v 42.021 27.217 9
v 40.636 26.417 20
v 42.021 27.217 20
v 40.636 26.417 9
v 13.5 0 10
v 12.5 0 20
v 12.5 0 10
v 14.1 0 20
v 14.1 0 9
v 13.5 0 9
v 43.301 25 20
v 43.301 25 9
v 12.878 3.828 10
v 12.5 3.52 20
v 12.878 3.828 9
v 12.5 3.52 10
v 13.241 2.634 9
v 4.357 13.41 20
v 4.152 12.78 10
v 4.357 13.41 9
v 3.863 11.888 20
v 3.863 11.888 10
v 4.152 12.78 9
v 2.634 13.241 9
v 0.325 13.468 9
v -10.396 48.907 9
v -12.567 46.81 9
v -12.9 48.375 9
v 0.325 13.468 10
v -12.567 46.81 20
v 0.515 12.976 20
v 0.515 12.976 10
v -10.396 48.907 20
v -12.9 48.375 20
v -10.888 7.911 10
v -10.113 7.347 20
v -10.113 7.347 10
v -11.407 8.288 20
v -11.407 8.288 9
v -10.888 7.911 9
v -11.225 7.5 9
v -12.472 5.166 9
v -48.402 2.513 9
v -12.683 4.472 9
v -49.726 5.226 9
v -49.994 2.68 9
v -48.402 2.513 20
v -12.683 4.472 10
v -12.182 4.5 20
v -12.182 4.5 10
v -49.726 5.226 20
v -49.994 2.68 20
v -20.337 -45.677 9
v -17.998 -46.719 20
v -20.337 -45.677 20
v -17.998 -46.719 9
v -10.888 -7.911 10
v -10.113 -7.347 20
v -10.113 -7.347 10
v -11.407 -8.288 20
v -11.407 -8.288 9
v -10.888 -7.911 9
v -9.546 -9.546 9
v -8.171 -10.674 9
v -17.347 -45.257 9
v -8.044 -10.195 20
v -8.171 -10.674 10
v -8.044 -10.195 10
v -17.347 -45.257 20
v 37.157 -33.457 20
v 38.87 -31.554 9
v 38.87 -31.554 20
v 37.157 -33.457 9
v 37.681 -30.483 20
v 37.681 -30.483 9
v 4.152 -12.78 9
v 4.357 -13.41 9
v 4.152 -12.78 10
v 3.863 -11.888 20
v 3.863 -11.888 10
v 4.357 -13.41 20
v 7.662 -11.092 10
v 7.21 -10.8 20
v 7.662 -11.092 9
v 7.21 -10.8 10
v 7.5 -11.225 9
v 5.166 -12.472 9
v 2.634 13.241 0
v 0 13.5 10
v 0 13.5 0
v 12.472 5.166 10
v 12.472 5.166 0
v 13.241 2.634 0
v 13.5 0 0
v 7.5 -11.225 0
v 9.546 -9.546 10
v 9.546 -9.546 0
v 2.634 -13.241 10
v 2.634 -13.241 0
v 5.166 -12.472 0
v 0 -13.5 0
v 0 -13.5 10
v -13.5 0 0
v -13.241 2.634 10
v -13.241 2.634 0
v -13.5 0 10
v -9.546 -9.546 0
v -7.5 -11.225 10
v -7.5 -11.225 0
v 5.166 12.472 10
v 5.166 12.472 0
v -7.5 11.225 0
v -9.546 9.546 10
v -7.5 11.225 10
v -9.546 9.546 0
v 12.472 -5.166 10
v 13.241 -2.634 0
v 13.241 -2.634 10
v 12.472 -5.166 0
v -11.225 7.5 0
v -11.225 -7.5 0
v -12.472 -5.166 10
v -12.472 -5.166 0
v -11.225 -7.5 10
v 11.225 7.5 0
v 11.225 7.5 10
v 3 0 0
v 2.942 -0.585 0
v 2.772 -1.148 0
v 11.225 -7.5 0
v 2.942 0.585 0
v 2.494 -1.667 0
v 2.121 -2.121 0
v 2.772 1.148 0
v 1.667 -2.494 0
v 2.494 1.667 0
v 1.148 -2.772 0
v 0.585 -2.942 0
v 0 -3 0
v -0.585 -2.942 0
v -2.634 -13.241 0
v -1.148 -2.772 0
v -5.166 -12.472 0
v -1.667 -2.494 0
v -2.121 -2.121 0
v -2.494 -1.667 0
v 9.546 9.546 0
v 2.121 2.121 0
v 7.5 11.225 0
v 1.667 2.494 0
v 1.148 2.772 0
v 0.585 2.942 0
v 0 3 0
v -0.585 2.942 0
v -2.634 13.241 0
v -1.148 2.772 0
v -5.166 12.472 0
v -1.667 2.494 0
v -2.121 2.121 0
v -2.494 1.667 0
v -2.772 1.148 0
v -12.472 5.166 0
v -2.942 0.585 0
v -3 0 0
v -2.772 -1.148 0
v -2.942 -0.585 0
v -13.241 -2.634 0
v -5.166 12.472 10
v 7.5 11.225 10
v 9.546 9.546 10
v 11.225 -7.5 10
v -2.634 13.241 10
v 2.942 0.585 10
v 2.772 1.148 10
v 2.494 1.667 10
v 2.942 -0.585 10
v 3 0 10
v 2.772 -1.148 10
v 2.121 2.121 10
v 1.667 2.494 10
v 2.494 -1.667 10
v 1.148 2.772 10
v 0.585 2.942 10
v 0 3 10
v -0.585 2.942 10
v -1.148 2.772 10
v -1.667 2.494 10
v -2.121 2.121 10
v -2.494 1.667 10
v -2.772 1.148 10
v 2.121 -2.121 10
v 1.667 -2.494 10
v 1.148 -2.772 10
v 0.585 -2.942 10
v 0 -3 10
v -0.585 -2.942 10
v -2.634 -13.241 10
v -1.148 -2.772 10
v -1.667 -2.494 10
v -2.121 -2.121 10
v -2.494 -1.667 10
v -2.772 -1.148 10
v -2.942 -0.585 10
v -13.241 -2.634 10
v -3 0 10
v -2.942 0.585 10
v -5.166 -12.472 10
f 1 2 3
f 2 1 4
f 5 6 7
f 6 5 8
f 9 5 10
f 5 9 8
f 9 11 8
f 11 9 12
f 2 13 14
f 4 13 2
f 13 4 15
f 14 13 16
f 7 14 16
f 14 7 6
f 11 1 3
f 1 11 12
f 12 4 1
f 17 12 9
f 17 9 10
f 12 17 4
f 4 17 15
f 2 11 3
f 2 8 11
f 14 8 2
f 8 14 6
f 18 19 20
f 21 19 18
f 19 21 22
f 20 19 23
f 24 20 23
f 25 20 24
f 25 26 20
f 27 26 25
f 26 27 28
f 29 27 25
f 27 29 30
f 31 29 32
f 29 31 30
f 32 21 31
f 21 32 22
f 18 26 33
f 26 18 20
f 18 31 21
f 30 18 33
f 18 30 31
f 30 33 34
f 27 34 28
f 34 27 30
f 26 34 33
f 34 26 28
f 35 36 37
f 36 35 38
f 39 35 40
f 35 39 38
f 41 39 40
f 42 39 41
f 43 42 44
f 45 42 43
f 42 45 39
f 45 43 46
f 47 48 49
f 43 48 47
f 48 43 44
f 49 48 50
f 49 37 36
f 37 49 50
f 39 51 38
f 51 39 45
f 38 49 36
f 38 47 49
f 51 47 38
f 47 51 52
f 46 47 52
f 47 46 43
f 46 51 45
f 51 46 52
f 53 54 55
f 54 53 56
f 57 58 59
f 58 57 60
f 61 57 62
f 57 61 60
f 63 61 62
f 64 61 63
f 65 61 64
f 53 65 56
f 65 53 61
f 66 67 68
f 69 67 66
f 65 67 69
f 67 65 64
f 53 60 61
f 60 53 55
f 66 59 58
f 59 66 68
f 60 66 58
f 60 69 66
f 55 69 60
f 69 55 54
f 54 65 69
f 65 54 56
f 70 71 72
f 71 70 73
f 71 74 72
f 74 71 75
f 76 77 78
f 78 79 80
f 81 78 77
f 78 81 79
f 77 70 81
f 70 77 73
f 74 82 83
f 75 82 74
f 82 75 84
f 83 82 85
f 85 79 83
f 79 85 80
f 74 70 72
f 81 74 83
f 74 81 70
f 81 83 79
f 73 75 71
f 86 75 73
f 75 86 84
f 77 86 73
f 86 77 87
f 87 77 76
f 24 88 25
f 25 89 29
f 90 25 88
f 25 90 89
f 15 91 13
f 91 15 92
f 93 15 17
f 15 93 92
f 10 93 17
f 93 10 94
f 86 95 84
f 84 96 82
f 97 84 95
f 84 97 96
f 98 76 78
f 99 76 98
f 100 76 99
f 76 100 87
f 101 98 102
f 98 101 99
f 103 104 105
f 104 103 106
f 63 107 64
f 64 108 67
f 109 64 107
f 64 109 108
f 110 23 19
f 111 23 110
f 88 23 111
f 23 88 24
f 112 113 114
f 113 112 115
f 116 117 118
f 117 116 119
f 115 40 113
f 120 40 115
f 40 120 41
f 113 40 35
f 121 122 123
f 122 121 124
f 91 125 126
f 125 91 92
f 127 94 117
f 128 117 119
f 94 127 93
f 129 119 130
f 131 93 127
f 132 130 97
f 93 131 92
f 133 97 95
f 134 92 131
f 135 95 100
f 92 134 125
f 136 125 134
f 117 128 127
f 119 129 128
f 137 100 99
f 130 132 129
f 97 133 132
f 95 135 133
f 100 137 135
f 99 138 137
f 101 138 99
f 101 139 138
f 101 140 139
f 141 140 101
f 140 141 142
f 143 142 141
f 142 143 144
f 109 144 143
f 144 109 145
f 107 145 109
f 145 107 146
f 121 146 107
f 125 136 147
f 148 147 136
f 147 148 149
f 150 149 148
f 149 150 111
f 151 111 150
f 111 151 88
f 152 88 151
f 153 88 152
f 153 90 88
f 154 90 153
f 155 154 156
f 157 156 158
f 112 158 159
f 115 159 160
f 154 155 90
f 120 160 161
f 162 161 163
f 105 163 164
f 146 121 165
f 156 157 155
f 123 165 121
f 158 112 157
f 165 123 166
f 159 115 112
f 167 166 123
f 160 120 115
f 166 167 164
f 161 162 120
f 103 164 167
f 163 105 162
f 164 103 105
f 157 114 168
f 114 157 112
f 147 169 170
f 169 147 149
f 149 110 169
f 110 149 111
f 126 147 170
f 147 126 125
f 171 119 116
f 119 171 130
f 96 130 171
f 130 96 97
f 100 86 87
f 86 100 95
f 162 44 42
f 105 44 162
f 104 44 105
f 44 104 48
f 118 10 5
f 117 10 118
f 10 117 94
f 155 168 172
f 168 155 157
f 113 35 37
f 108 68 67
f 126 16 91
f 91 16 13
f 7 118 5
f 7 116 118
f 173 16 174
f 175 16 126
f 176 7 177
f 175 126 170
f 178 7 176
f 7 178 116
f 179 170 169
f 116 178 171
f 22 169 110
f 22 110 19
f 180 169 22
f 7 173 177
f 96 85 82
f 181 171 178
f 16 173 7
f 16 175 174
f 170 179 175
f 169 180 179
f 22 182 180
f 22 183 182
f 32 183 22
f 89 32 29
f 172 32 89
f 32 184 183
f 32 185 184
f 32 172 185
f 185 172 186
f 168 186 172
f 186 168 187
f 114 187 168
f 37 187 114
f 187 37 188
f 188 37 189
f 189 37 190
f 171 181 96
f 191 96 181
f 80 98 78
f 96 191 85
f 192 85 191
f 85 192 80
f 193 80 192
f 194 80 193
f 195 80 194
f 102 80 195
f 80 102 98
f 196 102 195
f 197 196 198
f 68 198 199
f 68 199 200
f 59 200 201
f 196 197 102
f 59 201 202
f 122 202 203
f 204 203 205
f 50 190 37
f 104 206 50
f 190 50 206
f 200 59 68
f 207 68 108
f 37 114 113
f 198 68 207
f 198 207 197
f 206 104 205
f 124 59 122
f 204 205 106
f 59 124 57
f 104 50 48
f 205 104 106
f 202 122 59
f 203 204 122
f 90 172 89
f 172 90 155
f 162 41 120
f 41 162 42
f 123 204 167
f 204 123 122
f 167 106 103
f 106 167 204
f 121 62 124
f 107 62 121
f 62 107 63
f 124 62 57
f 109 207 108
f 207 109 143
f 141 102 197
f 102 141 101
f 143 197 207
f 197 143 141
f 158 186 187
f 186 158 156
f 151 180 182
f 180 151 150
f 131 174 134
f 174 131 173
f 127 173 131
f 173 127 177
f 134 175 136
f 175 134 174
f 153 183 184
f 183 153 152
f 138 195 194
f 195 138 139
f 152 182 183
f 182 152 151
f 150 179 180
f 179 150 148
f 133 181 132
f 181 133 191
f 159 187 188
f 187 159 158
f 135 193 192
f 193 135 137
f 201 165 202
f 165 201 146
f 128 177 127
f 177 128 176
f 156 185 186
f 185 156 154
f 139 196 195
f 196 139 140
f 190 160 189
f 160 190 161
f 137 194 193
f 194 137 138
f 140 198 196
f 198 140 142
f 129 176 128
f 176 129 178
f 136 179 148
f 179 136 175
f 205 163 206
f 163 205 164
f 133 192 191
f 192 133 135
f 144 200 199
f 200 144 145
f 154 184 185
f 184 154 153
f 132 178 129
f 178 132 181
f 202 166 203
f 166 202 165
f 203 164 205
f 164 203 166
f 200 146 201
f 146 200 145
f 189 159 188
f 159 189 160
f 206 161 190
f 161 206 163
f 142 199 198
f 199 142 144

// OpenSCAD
$fn = 32;

// ----------------------------------------------------------------------
// Impeller: 100 mm, 5 blades, 20 mm tall
// ----------------------------------------------------------------------

// --- parameters (mm) ---
hub_d = 27;               // hub diameter
hub_h = 10;               // hub height
imp_d = 100;              // outer diameter over the blades
blades = 5;               // number of blades
blade_t = 1.6;            // blade thickness
blade_h = 10;             // blade height
blade_in_r = 12.5;        // blade root radius
blade_out_r = 48.4;       // blade tip radius
sweep = 30;               // blade sweep, degrees
bore_d = 6;               // shaft bore

module hub() {
  cylinder(h = hub_h, d = hub_d);
}

module blade() {
  /* blade swept between two boxes: hull of the root and the tip section */
  hull() {
    translate([blade_in_r, 0, hub_h - 1])
      cube([blade_t, blade_t * 2.2, blade_h + 1], center = false);
    rotate([0, 0, sweep])
      translate([blade_out_r, 0, hub_h - 1])
        cube([blade_t, blade_t * 1.6, blade_h + 1], center = false);
  }
}

module blades() {
  for (i = [0 : blades - 1])
    rotate([0, 0, i * 360 / blades]) blade();
}

difference() {
  union() {
    hub();
    blades();
  }
  translate([0, 0, -1]) cylinder(h = hub_h + blade_h + 0 + 3, d = bore_d);
}
